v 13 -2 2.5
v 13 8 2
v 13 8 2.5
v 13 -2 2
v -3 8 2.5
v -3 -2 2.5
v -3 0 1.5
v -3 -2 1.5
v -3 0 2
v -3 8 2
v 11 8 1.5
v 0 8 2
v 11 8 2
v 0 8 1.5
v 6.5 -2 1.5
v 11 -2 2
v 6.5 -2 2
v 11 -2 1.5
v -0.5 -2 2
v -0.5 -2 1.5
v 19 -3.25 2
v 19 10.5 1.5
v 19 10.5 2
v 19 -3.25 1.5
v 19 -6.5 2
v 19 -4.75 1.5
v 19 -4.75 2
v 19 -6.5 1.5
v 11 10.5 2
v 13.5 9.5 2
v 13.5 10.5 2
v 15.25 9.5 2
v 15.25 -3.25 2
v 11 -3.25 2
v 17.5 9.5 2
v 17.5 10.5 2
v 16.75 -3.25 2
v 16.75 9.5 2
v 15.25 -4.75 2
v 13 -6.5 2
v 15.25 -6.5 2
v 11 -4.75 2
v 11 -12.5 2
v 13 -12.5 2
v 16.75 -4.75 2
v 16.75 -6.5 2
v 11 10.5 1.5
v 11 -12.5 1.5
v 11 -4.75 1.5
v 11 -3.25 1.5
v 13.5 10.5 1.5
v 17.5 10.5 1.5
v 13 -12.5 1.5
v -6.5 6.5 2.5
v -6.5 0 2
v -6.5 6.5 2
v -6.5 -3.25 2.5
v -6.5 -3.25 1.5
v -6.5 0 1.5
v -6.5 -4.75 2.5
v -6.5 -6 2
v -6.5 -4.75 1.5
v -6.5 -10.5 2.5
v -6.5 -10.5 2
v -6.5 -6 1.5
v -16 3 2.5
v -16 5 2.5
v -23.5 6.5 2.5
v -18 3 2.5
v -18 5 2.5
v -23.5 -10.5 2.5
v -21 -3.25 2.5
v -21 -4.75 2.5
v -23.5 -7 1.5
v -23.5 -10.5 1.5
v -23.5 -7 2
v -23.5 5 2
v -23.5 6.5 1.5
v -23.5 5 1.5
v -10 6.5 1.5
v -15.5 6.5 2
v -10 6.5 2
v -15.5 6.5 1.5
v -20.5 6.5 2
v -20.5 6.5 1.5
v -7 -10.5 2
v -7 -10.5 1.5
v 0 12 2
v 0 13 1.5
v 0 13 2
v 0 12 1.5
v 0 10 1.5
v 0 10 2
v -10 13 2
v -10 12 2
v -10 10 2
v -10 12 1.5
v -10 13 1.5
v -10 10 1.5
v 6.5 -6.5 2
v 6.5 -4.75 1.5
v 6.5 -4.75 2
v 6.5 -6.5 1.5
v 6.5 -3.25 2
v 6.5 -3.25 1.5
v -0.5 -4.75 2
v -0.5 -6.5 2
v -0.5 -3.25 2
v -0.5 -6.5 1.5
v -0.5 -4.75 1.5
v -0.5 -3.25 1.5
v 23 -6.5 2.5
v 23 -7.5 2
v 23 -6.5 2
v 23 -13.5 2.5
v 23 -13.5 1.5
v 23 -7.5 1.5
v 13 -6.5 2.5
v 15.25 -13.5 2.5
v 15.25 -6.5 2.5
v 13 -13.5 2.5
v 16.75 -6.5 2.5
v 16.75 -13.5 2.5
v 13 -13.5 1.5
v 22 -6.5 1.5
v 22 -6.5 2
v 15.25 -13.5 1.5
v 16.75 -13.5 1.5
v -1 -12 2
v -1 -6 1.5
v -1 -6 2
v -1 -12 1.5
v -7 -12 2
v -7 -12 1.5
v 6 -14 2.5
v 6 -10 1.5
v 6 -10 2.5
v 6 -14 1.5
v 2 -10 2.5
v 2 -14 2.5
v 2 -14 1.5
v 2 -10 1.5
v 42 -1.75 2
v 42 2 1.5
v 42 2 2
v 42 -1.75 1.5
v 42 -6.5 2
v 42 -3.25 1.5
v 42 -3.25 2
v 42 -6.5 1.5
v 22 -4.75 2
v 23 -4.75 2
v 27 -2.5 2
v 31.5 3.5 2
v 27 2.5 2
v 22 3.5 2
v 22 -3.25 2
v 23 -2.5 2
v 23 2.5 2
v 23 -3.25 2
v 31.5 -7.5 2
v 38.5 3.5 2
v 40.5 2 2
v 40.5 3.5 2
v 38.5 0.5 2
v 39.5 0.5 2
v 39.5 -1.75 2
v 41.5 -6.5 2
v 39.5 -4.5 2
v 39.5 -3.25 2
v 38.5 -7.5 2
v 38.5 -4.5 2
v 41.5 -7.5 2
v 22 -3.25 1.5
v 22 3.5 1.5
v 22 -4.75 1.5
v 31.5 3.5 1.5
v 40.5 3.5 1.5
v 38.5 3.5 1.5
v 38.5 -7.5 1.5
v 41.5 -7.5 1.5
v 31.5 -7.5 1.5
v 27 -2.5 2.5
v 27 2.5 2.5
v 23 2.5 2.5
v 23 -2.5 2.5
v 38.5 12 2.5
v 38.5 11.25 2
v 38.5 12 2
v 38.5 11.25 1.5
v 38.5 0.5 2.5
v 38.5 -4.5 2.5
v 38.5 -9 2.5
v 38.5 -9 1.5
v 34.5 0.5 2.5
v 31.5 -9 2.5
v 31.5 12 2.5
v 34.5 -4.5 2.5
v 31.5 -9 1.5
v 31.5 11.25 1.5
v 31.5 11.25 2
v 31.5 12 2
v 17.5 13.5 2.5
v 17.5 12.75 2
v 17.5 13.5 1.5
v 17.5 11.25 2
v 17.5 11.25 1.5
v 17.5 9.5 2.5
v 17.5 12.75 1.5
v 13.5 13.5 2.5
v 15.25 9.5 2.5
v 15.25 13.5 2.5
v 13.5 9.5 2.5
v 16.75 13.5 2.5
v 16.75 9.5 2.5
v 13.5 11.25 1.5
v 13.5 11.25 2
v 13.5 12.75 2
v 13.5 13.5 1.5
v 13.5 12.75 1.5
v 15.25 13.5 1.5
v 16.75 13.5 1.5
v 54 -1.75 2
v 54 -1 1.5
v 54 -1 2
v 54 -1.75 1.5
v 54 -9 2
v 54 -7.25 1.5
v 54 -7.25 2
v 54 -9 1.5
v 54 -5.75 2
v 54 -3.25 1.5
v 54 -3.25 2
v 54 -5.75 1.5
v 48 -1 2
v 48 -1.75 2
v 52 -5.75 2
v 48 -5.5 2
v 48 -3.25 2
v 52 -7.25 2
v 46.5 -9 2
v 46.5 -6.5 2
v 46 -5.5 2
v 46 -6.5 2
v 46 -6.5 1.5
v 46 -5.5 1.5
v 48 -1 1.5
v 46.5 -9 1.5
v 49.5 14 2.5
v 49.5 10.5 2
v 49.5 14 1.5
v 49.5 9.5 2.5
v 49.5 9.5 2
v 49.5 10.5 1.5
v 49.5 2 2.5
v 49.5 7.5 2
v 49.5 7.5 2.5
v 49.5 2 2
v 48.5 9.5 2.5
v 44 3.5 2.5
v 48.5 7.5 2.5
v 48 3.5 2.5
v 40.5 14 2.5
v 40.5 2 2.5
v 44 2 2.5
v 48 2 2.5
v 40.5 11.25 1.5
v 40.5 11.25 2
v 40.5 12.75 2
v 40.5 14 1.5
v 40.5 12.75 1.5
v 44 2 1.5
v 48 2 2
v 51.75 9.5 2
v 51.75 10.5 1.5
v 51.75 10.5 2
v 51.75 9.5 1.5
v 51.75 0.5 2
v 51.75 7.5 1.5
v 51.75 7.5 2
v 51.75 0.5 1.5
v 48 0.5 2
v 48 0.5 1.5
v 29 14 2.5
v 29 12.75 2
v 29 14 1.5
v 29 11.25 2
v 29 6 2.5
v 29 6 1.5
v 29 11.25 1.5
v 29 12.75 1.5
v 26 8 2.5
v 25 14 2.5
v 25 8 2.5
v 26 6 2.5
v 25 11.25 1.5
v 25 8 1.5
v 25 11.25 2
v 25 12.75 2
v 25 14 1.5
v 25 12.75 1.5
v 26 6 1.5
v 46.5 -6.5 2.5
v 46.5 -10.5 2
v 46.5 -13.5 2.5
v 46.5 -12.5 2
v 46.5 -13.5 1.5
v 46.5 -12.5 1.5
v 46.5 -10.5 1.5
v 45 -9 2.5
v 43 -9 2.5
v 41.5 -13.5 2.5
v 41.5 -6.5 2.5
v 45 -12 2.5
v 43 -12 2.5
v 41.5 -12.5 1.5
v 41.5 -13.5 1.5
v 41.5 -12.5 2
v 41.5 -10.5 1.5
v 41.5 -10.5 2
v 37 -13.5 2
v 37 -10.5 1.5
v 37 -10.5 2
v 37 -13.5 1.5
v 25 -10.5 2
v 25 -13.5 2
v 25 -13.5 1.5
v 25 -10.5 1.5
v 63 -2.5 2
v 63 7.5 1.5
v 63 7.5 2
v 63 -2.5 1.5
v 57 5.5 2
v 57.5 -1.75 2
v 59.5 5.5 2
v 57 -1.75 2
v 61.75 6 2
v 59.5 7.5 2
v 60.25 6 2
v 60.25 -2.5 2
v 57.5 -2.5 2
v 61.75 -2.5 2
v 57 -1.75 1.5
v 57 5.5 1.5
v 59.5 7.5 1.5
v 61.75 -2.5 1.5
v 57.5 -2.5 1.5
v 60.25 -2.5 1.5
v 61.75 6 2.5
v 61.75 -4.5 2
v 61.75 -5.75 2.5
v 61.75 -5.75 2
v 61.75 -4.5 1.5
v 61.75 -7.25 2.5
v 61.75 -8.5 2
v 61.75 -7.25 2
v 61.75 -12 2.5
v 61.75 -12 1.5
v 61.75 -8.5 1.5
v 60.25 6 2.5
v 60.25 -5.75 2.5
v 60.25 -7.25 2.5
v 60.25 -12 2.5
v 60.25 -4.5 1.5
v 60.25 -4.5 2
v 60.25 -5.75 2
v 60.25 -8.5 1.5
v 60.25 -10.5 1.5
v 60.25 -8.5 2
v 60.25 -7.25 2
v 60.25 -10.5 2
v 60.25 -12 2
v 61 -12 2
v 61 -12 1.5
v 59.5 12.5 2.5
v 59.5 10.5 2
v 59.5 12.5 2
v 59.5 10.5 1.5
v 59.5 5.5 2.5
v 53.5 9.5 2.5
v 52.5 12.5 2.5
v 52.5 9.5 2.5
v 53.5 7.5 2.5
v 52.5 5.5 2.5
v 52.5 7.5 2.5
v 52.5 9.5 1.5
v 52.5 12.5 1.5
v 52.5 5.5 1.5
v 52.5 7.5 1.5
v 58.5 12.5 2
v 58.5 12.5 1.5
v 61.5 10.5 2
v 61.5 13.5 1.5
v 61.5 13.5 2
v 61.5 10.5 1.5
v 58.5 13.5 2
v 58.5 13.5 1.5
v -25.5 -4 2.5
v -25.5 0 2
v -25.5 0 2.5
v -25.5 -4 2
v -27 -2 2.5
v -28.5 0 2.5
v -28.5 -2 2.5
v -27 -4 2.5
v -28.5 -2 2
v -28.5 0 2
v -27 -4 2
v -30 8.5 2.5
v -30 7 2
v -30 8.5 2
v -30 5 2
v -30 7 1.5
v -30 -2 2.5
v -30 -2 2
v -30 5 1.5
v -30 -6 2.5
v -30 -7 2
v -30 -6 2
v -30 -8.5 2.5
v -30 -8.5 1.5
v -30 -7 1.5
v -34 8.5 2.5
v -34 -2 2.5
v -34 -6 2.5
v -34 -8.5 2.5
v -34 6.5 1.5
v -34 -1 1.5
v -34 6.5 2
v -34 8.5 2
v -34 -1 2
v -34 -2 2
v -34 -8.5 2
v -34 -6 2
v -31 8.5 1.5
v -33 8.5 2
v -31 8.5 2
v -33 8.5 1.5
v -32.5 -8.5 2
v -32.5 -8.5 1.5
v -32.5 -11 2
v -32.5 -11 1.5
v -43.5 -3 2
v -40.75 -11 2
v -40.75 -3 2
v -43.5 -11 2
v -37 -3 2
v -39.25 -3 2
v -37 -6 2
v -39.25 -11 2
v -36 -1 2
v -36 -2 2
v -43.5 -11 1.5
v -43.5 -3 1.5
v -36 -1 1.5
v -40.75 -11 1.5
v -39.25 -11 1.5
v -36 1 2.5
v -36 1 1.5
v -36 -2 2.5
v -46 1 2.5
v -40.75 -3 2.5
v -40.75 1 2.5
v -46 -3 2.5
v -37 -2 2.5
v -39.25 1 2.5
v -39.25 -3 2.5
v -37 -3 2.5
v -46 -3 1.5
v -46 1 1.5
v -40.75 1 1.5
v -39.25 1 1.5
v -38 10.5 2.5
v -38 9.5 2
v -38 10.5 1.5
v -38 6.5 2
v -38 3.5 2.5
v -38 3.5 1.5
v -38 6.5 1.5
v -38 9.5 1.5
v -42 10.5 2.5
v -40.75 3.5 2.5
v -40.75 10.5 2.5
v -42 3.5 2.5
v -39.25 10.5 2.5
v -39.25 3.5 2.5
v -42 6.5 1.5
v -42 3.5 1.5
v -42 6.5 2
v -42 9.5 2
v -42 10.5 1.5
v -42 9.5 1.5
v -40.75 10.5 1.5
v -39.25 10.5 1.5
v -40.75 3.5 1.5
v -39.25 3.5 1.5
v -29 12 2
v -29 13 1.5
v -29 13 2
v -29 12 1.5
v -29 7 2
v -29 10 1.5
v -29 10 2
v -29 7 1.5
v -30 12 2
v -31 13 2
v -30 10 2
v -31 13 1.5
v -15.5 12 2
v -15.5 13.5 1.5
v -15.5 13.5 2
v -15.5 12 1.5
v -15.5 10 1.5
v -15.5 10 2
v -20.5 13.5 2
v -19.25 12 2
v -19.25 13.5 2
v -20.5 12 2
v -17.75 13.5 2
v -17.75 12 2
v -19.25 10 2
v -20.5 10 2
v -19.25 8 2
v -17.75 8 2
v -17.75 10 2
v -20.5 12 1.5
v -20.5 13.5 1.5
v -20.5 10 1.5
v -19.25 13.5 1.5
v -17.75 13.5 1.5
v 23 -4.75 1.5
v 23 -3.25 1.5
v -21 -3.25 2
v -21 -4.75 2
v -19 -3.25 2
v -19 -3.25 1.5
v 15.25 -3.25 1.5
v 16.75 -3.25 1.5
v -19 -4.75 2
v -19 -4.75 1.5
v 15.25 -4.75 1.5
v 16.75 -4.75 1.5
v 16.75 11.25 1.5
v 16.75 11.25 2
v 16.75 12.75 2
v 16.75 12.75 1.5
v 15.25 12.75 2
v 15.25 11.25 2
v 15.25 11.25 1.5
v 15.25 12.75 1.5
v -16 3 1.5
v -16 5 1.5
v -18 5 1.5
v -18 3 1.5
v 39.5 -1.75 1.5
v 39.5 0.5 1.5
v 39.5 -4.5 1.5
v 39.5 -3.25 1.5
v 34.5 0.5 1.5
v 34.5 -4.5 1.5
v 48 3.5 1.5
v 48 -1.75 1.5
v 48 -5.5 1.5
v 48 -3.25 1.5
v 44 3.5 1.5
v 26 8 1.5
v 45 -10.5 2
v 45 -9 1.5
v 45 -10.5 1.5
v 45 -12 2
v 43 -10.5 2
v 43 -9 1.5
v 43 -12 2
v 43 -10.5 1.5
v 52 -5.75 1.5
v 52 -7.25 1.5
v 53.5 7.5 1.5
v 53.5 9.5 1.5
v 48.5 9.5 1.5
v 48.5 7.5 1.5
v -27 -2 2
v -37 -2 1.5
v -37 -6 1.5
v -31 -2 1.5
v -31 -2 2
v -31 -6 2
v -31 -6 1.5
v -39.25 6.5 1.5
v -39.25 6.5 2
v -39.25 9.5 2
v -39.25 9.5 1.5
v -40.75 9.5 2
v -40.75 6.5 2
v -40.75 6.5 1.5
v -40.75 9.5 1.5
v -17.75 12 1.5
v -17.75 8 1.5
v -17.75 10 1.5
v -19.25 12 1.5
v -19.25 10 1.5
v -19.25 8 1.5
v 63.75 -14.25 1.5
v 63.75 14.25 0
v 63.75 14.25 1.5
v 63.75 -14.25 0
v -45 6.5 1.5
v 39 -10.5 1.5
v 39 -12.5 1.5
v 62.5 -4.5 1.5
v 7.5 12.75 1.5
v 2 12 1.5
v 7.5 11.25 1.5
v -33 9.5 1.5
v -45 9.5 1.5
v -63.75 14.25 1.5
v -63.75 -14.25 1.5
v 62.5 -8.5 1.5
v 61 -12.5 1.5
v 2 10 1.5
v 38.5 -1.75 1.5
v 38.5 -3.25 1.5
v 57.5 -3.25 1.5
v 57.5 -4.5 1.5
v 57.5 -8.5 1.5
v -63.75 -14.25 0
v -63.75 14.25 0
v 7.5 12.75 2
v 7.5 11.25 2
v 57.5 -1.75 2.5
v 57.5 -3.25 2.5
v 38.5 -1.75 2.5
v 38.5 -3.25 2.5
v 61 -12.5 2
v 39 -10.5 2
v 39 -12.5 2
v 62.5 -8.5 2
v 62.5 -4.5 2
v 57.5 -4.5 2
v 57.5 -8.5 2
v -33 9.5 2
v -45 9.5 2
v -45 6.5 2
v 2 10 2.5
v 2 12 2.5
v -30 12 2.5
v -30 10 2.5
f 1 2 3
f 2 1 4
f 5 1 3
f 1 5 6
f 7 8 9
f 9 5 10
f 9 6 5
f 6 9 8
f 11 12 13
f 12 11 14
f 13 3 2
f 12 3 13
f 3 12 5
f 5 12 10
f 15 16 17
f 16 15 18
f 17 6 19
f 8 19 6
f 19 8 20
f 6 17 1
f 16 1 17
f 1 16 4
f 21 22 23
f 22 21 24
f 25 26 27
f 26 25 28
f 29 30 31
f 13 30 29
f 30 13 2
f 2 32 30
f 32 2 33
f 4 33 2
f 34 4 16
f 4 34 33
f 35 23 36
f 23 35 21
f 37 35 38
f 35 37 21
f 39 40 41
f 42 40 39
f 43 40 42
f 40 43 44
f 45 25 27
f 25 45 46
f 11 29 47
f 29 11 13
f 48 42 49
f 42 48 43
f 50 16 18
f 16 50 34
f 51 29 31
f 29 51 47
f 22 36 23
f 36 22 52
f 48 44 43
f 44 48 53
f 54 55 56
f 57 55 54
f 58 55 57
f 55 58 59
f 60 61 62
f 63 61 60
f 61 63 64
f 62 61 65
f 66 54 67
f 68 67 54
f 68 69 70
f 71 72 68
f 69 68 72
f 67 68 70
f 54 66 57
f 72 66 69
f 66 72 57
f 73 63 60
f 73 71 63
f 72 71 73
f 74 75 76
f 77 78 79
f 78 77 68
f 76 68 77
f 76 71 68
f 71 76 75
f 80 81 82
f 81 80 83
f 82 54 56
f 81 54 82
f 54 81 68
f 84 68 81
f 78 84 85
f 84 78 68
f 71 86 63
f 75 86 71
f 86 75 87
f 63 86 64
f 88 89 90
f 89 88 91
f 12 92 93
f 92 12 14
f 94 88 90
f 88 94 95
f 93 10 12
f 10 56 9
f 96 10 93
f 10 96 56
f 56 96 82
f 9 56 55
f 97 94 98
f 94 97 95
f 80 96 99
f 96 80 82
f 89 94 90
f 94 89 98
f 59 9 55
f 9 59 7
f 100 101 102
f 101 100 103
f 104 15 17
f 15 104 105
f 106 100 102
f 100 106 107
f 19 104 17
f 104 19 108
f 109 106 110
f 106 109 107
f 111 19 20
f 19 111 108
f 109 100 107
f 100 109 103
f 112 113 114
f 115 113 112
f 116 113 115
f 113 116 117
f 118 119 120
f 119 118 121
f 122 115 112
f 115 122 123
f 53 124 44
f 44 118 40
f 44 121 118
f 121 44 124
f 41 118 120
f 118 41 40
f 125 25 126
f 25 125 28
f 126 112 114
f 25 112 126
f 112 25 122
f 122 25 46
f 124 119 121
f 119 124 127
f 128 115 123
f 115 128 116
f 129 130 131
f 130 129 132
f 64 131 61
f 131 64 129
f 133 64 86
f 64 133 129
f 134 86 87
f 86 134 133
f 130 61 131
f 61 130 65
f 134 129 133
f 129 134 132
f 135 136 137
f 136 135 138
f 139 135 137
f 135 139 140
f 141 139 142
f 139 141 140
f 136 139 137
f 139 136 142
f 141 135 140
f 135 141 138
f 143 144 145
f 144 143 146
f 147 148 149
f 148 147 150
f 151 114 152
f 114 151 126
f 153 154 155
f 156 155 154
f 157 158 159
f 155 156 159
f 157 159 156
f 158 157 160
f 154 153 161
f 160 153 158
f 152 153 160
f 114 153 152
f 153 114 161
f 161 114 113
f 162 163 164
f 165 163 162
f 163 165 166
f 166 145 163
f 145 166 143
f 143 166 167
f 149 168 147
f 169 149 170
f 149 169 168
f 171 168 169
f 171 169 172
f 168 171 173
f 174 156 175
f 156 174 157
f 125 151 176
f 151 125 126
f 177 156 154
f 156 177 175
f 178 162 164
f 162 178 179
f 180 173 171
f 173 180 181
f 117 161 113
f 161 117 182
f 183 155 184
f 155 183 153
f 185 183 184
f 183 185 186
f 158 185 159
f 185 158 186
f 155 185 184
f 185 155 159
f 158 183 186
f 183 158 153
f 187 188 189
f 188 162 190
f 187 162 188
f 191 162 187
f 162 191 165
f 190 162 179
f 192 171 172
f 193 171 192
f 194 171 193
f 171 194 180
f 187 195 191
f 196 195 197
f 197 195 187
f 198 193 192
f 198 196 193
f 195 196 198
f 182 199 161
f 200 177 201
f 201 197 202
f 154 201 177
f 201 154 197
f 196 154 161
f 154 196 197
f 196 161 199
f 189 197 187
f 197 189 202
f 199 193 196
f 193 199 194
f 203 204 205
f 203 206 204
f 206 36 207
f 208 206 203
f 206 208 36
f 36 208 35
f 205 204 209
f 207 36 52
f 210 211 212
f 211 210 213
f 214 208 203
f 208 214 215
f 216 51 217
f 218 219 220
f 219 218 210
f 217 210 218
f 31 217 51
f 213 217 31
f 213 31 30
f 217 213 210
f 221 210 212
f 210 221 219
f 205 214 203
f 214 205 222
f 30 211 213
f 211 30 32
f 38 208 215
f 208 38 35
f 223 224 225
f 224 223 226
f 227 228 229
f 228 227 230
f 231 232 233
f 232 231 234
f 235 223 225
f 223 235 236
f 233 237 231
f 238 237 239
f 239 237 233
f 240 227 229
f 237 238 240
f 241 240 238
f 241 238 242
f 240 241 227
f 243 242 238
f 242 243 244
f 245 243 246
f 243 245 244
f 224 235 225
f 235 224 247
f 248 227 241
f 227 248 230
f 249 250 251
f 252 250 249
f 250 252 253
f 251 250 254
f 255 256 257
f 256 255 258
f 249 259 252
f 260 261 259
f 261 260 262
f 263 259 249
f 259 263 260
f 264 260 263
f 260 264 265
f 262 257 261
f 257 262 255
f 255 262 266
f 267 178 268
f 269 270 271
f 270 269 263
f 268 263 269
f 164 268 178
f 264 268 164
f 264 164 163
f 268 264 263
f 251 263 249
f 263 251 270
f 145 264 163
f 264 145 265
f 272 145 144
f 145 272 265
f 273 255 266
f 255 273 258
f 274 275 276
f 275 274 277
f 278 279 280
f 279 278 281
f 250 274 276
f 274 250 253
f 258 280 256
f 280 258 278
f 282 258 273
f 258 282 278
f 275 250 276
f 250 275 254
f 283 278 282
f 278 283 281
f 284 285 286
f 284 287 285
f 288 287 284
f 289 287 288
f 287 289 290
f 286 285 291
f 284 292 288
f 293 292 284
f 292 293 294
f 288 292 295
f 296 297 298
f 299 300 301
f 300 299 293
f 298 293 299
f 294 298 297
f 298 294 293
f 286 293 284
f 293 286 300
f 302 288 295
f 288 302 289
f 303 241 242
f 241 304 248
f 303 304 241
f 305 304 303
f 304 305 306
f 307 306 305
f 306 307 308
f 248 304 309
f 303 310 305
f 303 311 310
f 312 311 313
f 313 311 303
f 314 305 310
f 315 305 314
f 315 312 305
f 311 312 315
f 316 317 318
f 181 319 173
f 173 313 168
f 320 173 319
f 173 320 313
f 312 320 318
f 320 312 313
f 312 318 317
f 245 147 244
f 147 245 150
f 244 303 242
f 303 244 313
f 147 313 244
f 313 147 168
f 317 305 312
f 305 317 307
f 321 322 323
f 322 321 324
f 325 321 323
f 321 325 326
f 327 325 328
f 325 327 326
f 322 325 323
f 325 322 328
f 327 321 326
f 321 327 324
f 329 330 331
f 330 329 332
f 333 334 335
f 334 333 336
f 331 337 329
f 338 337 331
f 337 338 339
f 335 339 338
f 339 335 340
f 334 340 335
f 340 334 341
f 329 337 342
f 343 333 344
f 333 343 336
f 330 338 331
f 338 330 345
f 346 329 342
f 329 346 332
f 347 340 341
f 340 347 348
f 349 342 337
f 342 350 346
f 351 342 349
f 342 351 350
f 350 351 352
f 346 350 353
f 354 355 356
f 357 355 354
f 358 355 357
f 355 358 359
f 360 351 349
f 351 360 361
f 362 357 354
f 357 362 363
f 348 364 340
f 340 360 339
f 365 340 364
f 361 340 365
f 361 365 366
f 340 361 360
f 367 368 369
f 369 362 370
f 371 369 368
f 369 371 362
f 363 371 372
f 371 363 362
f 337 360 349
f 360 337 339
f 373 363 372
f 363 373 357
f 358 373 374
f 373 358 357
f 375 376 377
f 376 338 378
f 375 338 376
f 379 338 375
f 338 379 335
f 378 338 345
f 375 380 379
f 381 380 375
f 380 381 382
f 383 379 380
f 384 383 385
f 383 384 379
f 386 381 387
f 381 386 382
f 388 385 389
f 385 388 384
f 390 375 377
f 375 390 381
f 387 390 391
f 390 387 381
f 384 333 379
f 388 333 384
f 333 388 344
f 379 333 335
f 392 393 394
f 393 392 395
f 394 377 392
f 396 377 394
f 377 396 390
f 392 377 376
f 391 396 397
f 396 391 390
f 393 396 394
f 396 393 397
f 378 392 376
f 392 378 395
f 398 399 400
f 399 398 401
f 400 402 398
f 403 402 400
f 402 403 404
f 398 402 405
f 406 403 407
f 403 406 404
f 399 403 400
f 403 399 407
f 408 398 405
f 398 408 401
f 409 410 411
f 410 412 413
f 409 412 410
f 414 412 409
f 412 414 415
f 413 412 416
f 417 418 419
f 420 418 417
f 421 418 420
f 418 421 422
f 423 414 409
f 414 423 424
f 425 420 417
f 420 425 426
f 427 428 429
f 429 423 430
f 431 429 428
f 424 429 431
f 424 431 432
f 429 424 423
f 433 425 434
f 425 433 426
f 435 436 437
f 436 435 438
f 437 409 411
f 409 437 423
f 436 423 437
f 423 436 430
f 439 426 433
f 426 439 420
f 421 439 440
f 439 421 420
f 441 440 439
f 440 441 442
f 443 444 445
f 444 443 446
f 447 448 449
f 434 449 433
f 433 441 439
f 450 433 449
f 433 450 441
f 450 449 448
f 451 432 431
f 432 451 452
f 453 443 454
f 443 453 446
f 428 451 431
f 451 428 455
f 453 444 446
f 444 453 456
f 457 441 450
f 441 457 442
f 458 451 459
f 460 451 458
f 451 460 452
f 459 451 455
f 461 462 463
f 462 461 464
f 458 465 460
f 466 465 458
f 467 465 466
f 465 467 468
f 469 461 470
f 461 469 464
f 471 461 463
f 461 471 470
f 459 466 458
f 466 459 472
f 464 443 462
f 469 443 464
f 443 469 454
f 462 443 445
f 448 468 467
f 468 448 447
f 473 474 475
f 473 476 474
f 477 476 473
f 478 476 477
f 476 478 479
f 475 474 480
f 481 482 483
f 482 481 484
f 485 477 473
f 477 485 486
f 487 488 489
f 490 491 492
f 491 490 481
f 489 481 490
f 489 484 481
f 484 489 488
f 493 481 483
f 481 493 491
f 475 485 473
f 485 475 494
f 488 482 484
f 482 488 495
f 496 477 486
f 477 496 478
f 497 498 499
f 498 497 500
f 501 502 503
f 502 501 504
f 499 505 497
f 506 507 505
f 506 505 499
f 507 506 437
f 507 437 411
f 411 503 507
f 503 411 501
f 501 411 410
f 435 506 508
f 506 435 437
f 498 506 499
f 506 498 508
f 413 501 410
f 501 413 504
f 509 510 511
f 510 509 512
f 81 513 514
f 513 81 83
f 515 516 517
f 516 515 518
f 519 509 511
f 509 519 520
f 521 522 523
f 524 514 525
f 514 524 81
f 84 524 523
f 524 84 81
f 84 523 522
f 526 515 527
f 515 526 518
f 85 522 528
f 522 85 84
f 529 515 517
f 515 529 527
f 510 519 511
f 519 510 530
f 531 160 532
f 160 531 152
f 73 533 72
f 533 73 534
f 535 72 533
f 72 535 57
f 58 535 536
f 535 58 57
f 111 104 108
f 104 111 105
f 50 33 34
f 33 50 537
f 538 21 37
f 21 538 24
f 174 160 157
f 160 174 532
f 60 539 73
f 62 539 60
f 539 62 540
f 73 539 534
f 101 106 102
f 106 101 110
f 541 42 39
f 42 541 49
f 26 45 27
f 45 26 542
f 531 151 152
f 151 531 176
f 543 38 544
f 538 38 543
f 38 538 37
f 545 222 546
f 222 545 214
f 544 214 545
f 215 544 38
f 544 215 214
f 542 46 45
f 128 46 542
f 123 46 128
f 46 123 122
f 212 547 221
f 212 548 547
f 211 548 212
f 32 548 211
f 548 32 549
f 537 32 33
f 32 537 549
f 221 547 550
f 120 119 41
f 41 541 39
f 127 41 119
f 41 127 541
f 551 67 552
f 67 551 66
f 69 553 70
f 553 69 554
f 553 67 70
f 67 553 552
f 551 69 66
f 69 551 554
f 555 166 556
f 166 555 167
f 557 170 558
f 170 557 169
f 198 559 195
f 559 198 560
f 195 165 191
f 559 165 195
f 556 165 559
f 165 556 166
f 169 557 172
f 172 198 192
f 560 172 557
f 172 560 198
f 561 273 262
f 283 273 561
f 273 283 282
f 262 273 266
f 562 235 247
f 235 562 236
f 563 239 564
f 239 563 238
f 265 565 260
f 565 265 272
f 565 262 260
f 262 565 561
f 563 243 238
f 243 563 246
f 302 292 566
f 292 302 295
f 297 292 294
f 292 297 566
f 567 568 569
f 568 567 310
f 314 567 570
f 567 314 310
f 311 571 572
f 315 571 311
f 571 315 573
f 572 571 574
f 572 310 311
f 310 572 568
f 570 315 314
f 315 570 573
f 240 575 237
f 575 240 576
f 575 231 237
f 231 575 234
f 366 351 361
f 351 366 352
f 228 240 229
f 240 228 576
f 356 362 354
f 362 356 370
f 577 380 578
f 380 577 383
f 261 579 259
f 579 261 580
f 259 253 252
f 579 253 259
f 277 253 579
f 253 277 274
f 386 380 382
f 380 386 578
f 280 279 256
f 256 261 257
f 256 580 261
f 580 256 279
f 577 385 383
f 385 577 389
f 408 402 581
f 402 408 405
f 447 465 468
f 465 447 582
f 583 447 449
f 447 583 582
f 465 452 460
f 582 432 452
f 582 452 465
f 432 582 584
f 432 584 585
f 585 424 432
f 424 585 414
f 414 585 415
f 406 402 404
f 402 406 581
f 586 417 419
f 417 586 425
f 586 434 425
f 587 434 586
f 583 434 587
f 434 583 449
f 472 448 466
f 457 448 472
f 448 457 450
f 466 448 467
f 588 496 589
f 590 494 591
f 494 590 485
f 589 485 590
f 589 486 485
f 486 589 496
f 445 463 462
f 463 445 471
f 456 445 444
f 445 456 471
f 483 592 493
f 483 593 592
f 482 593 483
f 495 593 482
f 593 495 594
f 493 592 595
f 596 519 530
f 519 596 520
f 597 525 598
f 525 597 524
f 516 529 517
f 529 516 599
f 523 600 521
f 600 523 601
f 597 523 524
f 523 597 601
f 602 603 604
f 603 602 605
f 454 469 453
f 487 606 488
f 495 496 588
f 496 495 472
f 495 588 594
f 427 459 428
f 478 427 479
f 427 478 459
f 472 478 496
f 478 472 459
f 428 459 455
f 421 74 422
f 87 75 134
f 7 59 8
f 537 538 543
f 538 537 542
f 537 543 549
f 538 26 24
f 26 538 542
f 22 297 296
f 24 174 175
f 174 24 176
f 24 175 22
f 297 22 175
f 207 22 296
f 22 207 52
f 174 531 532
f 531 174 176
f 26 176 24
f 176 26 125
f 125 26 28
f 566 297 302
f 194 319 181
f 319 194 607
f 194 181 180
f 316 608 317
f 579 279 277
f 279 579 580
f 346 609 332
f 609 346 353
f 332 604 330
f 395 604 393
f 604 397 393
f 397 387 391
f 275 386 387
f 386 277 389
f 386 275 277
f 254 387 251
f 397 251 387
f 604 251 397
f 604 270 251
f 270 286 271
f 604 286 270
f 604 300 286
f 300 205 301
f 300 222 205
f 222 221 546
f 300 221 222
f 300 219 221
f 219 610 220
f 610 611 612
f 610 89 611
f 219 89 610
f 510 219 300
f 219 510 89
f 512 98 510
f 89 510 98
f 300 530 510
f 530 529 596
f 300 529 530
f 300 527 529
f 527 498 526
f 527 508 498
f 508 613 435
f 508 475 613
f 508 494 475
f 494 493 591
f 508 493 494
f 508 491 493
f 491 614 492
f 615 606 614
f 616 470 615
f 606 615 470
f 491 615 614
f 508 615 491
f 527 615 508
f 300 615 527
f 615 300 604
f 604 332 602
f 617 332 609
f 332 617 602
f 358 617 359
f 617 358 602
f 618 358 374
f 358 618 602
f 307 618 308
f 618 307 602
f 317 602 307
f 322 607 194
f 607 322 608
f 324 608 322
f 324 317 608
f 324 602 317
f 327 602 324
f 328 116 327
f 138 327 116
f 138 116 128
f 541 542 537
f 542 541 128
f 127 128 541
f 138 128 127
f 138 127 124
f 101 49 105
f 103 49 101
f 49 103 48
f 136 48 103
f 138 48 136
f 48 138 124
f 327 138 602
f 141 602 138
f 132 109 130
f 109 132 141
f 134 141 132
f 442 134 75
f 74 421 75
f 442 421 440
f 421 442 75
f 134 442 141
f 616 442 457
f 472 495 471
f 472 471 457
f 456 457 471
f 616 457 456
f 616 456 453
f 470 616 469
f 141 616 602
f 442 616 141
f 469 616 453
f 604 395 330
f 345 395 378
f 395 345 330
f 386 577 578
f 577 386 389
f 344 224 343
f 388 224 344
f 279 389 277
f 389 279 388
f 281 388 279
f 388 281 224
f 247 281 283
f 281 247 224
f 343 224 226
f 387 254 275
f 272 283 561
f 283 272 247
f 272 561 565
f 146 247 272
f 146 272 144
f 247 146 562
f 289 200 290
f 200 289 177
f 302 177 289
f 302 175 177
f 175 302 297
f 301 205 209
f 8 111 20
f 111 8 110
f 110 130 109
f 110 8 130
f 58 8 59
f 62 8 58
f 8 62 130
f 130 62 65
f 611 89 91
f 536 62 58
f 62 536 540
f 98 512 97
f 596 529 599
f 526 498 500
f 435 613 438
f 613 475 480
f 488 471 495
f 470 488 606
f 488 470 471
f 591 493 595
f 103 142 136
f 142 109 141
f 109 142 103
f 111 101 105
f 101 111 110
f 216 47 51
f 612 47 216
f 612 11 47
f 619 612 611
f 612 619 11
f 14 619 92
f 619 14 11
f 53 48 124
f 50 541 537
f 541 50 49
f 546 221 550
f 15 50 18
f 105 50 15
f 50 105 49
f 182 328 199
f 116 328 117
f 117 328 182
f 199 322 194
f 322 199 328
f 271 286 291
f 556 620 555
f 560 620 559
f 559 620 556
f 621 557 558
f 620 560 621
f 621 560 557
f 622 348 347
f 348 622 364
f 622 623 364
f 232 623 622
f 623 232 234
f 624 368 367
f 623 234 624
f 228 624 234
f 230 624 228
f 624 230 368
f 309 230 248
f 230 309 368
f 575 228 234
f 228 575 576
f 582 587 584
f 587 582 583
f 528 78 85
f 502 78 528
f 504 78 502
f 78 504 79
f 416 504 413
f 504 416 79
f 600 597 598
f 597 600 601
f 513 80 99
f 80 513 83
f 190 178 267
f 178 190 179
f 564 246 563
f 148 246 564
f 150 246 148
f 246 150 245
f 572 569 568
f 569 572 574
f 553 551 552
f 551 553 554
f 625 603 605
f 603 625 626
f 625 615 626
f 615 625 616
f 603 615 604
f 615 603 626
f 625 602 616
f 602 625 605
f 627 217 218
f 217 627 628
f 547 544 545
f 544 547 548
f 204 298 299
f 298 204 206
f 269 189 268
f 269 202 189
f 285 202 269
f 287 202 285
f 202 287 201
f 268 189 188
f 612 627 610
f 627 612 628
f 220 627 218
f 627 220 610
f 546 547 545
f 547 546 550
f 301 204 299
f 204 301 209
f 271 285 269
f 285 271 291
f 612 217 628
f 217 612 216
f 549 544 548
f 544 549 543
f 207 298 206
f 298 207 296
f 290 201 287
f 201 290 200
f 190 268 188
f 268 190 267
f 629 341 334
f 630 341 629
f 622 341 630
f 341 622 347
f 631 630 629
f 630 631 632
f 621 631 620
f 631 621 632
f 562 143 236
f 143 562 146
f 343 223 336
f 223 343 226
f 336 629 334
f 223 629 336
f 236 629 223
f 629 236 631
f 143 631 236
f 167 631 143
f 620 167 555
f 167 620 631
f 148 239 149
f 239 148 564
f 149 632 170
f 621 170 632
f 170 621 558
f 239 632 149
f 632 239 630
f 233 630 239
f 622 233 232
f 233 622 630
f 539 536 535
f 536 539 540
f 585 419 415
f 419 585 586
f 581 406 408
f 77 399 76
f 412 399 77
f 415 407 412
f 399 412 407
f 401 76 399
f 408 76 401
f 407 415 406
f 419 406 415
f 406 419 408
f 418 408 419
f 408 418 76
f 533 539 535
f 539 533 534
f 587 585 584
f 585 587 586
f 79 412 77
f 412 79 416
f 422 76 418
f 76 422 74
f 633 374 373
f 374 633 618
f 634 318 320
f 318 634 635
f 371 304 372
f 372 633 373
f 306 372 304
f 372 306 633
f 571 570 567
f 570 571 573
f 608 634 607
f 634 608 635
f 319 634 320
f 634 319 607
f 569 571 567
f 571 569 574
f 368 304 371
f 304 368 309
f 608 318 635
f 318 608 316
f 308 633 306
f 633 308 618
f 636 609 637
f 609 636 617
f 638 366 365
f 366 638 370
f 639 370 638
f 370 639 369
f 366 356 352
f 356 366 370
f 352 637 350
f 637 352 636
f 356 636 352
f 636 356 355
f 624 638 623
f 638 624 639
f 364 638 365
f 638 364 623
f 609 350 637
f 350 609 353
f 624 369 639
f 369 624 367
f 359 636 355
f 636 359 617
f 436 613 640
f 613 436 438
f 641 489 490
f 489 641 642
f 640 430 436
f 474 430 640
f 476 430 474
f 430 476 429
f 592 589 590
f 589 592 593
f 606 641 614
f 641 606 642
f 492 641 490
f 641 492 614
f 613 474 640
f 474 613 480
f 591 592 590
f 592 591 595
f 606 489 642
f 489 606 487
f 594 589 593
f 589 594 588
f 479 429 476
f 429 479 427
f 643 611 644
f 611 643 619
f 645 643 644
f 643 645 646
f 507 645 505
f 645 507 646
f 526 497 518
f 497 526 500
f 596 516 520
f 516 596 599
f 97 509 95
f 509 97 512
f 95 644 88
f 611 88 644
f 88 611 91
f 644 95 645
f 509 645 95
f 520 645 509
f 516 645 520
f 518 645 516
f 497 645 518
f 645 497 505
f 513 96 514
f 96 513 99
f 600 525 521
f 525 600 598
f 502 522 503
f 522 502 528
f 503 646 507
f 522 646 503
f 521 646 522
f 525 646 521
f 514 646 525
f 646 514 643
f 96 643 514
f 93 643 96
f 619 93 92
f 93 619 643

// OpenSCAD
wt = 1.5;
h = 0.5;
t = wt+2*h;

//difference() {
//   cube([121.5+2*(0.5+t)+2*wt,28.5+2*wt,t],center=true);
//    cube([121.5+2*(0.5+t),28.5,t+1],center=true);
//}
module rect(w,l,x,y,z) {
    translate([x,y,z]) cube([w,l,wt],center=true);
}
translate([0,0,t/2]) {
    #rect(121.5+2*(0.5+t),28.5,0,0,-h);
    difference() {
        union() {
            rect(16,10,5,3,h);
            rect(8,23,15,-1,0);
            rect(17,17,-15,-2,h);
            rect(10,13,-5,6.5,0);
            rect(7,7,3,-3,0);
            rect(10,7,18,-10,h);
            rect(6,6,-4,-9,0);
            rect(4,4,4,-12,h);
            rect(20,11,32,-2,0);
            rect(4,5,25,0,h);
            rect(7,21,35,1.5,h);
            rect(4,4,15.5,11.5,h);
            rect(8,8,50,-5,0);
            rect(9,12,45,8,h);
            rect(7.5,10,48,5.5,0);
            rect(4,8,27,10,h);
            rect(5,7,44,-10,h);
            rect(12,3,31,-12,0);
            rect(6,10,60,2.5,0);
            rect(1.5,18,61,-3,h);
            rect(7,7,56,9,h);
            rect(3,3,60,12,0);
            rect(3,4,-27,-2,h);
            rect(4,17,-32,0,h);
            rect(11,10,-38,-6,0);
            rect(10,4,-41,-1,h);
            rect(4,7,-40,7,h);
            rect(2,6,-30,10,0);      
            rect(5,13,-18,7,0);
        }
        rect(44,1.5,1,-4,h+.1);
        rect(1.5,40,16,0,h+.1);
        rect(2,2,-17,4,h+.1);
        rect(5,5,37,-2,h+.1);
        rect(4,9,46,-1,h+.1);
        rect(4,4,24,6,h+.1);
        rect(2,3,44,-10.5,h+.1);
        rect(10,1.5,57,-6.5,h+.1);
        rect(5,2,51,8.5,h+.1);
        rect(10,4,-32,-4,h+.1);
        rect(1.5,40,-40,0,h+.1);
        rect(1.5,6,-18.5,11,h+.1);
    }
    rect(35,1.5,25,12,0);
    rect(19,1.5,48,-2.5,h);
    rect(12,12,-25,-1,0);
    rect(22,2,50,-11.5,0);
    rect(5,4,60,-6.5,0);
    rect(12,3,-39,8,0);
    rect(32,2,-14,11,h);
}
